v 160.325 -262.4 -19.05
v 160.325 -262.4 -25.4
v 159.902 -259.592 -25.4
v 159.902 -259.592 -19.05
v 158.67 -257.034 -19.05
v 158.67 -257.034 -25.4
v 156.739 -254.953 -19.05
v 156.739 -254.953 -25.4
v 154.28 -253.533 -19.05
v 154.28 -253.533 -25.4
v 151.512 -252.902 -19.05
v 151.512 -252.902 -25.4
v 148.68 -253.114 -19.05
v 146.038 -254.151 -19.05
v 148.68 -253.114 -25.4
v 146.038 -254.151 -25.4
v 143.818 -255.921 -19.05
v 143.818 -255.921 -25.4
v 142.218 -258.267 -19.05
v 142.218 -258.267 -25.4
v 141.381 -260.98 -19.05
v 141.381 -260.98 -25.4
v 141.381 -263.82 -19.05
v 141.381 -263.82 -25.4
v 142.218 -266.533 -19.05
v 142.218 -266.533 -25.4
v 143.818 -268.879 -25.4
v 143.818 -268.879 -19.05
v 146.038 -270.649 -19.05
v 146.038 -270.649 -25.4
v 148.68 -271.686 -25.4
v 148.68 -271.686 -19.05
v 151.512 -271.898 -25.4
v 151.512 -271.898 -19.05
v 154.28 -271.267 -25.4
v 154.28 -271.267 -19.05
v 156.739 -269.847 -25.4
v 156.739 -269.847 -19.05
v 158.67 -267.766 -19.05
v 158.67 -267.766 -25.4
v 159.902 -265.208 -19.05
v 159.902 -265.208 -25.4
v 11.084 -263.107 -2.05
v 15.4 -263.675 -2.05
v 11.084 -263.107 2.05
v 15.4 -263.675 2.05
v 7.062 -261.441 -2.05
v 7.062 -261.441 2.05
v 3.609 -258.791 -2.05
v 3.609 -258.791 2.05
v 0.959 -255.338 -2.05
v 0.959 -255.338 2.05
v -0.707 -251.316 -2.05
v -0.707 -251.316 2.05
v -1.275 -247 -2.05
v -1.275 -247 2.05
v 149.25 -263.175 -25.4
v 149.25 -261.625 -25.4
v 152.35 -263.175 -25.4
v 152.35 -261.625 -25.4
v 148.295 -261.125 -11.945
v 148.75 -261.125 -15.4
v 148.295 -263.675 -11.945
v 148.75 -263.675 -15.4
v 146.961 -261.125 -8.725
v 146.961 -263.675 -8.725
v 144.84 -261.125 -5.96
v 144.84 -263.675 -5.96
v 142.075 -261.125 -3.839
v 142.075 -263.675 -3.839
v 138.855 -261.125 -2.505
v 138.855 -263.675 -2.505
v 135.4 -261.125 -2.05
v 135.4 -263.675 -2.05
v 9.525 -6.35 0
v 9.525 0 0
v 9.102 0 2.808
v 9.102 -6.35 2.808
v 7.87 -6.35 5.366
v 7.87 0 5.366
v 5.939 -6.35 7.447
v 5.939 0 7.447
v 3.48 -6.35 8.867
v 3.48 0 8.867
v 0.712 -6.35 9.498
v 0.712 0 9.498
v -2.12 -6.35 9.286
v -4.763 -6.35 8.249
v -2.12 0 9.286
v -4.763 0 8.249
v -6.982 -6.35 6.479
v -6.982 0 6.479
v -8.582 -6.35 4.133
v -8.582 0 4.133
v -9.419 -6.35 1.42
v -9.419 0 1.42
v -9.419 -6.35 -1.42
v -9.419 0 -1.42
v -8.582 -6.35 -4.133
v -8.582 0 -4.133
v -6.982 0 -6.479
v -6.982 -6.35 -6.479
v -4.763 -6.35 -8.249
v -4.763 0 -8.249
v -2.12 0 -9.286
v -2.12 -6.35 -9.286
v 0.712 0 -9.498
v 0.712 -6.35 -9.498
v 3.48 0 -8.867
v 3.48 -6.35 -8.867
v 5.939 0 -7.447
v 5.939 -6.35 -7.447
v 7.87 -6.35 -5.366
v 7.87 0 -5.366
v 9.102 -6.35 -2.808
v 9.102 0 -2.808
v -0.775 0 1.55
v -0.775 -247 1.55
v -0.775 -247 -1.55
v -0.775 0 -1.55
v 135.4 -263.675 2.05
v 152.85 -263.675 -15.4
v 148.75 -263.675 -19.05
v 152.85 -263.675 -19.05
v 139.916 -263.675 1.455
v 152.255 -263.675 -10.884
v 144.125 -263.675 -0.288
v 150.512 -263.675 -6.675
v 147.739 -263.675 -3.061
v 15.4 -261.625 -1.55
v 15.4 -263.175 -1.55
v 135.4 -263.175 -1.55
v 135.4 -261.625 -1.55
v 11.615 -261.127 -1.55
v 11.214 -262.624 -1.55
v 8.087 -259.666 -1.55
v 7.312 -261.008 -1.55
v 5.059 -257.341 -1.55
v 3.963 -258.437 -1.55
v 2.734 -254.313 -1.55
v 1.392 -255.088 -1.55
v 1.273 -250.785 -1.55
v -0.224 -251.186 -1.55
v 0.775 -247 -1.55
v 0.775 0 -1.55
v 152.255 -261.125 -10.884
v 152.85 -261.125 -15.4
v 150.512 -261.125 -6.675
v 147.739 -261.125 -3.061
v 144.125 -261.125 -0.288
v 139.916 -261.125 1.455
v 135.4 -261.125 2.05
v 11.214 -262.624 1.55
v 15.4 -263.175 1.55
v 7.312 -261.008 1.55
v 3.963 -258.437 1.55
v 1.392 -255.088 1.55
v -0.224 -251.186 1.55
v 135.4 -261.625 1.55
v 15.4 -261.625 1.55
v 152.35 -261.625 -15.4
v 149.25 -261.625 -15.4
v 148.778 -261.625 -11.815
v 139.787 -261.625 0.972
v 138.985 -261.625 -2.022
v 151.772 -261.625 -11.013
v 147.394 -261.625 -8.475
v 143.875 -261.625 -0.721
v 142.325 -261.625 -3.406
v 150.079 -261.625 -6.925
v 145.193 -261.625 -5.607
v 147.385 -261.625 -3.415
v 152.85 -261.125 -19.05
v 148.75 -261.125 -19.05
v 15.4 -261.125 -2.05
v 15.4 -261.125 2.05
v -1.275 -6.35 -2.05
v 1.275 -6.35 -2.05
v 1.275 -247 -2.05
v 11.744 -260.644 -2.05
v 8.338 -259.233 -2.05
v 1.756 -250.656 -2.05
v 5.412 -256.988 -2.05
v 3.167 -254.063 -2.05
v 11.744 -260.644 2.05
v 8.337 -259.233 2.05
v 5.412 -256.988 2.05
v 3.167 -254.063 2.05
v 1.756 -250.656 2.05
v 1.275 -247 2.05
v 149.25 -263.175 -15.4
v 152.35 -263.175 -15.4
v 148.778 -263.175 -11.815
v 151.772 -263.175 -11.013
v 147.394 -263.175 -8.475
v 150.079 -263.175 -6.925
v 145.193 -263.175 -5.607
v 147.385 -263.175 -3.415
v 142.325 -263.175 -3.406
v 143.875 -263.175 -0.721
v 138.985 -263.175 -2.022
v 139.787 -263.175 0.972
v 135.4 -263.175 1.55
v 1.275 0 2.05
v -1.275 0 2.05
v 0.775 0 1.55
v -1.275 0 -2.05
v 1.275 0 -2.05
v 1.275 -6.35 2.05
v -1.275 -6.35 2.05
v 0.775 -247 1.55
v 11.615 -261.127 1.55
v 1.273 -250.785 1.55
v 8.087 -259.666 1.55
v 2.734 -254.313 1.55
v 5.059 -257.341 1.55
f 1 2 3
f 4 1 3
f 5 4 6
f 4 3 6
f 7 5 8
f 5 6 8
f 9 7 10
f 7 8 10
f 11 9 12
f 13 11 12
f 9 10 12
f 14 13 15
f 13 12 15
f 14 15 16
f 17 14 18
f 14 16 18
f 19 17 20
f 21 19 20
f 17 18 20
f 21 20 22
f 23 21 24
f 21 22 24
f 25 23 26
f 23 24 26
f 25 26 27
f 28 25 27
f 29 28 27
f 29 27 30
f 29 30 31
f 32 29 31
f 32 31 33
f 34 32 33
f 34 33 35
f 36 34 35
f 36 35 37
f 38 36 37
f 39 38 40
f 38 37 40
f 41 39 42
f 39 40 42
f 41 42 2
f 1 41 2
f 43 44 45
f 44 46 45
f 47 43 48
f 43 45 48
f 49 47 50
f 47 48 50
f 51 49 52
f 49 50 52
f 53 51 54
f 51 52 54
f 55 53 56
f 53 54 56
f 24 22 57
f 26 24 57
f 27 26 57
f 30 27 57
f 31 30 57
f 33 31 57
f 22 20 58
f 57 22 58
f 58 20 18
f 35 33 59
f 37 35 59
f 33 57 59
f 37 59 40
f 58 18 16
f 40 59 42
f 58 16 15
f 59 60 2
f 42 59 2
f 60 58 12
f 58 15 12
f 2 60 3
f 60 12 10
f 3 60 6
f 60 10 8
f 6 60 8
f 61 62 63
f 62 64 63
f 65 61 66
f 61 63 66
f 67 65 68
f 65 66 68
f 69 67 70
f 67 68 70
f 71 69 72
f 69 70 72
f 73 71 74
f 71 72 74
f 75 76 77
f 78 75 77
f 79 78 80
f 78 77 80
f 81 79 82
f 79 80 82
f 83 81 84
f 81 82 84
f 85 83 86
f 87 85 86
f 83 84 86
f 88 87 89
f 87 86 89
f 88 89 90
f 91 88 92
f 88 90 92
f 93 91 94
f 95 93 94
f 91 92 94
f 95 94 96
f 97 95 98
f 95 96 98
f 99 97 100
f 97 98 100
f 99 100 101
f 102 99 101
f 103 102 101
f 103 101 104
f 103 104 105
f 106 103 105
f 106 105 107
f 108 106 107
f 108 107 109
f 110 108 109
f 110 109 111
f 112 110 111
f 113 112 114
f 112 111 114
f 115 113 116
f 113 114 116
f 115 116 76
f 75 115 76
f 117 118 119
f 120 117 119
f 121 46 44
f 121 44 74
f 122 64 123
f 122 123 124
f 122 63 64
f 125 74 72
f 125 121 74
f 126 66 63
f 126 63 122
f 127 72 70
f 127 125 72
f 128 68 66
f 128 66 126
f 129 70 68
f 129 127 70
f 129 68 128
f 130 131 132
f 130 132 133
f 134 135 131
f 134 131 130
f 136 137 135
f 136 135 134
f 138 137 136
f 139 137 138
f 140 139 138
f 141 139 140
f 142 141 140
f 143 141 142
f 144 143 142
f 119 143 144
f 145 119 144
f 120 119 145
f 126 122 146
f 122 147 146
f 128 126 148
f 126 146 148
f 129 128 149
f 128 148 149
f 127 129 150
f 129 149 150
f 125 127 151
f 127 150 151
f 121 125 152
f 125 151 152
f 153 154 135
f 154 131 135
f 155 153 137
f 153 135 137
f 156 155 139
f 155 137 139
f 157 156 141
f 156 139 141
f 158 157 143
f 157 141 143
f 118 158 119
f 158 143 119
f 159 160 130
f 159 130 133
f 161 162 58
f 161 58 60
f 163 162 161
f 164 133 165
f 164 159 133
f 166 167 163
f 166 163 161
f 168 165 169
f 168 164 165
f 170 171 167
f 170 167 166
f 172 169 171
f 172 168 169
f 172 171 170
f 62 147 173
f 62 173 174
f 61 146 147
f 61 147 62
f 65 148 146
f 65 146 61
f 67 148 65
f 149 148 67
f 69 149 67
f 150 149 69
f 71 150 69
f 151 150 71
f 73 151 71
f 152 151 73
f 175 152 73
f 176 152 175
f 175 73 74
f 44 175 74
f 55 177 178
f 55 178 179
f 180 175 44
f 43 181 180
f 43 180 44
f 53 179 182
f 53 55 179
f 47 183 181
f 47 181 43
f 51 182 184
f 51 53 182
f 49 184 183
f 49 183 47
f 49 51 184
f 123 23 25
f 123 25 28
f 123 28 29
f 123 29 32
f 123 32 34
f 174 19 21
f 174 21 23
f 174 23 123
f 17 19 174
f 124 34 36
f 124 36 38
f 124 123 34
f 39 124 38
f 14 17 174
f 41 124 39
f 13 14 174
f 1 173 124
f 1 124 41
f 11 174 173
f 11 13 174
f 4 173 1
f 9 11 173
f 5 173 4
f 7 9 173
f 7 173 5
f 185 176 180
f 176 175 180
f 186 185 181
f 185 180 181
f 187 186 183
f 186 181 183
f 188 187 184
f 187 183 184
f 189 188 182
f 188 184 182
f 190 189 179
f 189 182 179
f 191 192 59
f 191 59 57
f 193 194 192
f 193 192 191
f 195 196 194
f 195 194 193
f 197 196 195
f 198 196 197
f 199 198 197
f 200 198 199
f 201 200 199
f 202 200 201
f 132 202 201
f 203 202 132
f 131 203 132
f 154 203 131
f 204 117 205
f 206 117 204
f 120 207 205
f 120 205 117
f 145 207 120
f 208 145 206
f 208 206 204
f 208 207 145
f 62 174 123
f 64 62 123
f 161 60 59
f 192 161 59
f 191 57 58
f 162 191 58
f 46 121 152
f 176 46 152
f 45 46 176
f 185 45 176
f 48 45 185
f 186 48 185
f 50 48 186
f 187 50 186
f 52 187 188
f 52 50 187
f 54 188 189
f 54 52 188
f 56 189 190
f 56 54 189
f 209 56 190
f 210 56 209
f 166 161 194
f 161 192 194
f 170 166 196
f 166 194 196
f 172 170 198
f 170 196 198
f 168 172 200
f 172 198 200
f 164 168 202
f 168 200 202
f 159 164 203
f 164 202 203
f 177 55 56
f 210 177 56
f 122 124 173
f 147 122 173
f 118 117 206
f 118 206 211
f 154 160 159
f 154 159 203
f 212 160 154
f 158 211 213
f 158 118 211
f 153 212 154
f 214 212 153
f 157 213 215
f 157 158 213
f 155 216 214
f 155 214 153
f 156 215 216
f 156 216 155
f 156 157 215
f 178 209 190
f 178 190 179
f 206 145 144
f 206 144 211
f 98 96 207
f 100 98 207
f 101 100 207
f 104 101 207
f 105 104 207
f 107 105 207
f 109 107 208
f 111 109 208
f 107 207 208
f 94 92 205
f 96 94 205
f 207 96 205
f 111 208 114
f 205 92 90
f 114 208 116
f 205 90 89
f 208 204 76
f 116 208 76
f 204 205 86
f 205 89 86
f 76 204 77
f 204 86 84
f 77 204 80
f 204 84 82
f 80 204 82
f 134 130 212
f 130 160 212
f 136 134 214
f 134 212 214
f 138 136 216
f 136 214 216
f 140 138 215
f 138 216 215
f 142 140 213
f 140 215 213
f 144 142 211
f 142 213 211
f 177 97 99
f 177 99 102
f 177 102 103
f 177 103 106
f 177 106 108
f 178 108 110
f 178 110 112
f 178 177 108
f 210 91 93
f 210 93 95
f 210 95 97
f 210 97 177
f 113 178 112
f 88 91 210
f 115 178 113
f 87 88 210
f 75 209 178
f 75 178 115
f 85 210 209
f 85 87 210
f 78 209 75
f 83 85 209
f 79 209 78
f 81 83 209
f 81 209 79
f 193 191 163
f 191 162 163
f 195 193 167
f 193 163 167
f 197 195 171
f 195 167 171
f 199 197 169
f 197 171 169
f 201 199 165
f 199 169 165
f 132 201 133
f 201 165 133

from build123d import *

# Parameters (mm, degrees)
F5_W     = 4.1
F5_H     = 2.55
F5_W_2   = 3.1
F5_H_2   = 1.55
F5_R     = 9.525
F7_DEPTH = 6.35
F0_R     = 9.525
F0_W     = 2.55
F0_H     = 4.1
F8_DEPTH = 6.35


with BuildPart() as f6:
    # F6: sweep along a path in F3, F1
    with BuildLine(Plane.XZ.offset(262.4)) as f6_path:
        Line((150.8, -25.4), (150.8, -15.4))
        ThreePointArc((150.8, -15.4), (146.2894444303, -4.5105555697), (135.4, 0))
        Line((135.4, 0), (125.4, 0))
    with BuildLine(Plane.XY) as f6_path_2:
        Line((125.4, -262.4), (25.4, -262.4))
        Line((25.4, -262.4), (15.4, -262.4))
        ThreePointArc((15.4, -262.4), (4.5105555697, -257.8894444303), (0, -247))
        Line((0, -247), (0, -237))
        Line((0, -237), (0, 0))
    # F5 (on offset) → F6 (sweep)
    with BuildSketch(Plane.XY.offset(-25.4)):
        with Locations((150.8, -262.4)):
            Rectangle(F5_W, F5_H)
        with Locations((150.8, -262.4)):
            Rectangle(F5_W_2, F5_H_2, mode=Mode.SUBTRACT)
    sweep(path=f6_path.line + f6_path_2.line)

    # F5 (on offset) → F7 (join)
    with BuildSketch(Plane.XY.offset(-25.4)):
        with Locations((150.8, -262.4)):
            Circle(F5_R)
        with Locations((150.8, -262.4)):
            Rectangle(F5_W, F5_H, mode=Mode.SUBTRACT)
    extrude(amount=F7_DEPTH)

    # F0 (on Front) → F8 (join)
    with BuildSketch(Plane.XZ):
        Circle(F0_R)
        Rectangle(F0_W, F0_H, mode=Mode.SUBTRACT)
    extrude(amount=F8_DEPTH)


solid = f6.part
